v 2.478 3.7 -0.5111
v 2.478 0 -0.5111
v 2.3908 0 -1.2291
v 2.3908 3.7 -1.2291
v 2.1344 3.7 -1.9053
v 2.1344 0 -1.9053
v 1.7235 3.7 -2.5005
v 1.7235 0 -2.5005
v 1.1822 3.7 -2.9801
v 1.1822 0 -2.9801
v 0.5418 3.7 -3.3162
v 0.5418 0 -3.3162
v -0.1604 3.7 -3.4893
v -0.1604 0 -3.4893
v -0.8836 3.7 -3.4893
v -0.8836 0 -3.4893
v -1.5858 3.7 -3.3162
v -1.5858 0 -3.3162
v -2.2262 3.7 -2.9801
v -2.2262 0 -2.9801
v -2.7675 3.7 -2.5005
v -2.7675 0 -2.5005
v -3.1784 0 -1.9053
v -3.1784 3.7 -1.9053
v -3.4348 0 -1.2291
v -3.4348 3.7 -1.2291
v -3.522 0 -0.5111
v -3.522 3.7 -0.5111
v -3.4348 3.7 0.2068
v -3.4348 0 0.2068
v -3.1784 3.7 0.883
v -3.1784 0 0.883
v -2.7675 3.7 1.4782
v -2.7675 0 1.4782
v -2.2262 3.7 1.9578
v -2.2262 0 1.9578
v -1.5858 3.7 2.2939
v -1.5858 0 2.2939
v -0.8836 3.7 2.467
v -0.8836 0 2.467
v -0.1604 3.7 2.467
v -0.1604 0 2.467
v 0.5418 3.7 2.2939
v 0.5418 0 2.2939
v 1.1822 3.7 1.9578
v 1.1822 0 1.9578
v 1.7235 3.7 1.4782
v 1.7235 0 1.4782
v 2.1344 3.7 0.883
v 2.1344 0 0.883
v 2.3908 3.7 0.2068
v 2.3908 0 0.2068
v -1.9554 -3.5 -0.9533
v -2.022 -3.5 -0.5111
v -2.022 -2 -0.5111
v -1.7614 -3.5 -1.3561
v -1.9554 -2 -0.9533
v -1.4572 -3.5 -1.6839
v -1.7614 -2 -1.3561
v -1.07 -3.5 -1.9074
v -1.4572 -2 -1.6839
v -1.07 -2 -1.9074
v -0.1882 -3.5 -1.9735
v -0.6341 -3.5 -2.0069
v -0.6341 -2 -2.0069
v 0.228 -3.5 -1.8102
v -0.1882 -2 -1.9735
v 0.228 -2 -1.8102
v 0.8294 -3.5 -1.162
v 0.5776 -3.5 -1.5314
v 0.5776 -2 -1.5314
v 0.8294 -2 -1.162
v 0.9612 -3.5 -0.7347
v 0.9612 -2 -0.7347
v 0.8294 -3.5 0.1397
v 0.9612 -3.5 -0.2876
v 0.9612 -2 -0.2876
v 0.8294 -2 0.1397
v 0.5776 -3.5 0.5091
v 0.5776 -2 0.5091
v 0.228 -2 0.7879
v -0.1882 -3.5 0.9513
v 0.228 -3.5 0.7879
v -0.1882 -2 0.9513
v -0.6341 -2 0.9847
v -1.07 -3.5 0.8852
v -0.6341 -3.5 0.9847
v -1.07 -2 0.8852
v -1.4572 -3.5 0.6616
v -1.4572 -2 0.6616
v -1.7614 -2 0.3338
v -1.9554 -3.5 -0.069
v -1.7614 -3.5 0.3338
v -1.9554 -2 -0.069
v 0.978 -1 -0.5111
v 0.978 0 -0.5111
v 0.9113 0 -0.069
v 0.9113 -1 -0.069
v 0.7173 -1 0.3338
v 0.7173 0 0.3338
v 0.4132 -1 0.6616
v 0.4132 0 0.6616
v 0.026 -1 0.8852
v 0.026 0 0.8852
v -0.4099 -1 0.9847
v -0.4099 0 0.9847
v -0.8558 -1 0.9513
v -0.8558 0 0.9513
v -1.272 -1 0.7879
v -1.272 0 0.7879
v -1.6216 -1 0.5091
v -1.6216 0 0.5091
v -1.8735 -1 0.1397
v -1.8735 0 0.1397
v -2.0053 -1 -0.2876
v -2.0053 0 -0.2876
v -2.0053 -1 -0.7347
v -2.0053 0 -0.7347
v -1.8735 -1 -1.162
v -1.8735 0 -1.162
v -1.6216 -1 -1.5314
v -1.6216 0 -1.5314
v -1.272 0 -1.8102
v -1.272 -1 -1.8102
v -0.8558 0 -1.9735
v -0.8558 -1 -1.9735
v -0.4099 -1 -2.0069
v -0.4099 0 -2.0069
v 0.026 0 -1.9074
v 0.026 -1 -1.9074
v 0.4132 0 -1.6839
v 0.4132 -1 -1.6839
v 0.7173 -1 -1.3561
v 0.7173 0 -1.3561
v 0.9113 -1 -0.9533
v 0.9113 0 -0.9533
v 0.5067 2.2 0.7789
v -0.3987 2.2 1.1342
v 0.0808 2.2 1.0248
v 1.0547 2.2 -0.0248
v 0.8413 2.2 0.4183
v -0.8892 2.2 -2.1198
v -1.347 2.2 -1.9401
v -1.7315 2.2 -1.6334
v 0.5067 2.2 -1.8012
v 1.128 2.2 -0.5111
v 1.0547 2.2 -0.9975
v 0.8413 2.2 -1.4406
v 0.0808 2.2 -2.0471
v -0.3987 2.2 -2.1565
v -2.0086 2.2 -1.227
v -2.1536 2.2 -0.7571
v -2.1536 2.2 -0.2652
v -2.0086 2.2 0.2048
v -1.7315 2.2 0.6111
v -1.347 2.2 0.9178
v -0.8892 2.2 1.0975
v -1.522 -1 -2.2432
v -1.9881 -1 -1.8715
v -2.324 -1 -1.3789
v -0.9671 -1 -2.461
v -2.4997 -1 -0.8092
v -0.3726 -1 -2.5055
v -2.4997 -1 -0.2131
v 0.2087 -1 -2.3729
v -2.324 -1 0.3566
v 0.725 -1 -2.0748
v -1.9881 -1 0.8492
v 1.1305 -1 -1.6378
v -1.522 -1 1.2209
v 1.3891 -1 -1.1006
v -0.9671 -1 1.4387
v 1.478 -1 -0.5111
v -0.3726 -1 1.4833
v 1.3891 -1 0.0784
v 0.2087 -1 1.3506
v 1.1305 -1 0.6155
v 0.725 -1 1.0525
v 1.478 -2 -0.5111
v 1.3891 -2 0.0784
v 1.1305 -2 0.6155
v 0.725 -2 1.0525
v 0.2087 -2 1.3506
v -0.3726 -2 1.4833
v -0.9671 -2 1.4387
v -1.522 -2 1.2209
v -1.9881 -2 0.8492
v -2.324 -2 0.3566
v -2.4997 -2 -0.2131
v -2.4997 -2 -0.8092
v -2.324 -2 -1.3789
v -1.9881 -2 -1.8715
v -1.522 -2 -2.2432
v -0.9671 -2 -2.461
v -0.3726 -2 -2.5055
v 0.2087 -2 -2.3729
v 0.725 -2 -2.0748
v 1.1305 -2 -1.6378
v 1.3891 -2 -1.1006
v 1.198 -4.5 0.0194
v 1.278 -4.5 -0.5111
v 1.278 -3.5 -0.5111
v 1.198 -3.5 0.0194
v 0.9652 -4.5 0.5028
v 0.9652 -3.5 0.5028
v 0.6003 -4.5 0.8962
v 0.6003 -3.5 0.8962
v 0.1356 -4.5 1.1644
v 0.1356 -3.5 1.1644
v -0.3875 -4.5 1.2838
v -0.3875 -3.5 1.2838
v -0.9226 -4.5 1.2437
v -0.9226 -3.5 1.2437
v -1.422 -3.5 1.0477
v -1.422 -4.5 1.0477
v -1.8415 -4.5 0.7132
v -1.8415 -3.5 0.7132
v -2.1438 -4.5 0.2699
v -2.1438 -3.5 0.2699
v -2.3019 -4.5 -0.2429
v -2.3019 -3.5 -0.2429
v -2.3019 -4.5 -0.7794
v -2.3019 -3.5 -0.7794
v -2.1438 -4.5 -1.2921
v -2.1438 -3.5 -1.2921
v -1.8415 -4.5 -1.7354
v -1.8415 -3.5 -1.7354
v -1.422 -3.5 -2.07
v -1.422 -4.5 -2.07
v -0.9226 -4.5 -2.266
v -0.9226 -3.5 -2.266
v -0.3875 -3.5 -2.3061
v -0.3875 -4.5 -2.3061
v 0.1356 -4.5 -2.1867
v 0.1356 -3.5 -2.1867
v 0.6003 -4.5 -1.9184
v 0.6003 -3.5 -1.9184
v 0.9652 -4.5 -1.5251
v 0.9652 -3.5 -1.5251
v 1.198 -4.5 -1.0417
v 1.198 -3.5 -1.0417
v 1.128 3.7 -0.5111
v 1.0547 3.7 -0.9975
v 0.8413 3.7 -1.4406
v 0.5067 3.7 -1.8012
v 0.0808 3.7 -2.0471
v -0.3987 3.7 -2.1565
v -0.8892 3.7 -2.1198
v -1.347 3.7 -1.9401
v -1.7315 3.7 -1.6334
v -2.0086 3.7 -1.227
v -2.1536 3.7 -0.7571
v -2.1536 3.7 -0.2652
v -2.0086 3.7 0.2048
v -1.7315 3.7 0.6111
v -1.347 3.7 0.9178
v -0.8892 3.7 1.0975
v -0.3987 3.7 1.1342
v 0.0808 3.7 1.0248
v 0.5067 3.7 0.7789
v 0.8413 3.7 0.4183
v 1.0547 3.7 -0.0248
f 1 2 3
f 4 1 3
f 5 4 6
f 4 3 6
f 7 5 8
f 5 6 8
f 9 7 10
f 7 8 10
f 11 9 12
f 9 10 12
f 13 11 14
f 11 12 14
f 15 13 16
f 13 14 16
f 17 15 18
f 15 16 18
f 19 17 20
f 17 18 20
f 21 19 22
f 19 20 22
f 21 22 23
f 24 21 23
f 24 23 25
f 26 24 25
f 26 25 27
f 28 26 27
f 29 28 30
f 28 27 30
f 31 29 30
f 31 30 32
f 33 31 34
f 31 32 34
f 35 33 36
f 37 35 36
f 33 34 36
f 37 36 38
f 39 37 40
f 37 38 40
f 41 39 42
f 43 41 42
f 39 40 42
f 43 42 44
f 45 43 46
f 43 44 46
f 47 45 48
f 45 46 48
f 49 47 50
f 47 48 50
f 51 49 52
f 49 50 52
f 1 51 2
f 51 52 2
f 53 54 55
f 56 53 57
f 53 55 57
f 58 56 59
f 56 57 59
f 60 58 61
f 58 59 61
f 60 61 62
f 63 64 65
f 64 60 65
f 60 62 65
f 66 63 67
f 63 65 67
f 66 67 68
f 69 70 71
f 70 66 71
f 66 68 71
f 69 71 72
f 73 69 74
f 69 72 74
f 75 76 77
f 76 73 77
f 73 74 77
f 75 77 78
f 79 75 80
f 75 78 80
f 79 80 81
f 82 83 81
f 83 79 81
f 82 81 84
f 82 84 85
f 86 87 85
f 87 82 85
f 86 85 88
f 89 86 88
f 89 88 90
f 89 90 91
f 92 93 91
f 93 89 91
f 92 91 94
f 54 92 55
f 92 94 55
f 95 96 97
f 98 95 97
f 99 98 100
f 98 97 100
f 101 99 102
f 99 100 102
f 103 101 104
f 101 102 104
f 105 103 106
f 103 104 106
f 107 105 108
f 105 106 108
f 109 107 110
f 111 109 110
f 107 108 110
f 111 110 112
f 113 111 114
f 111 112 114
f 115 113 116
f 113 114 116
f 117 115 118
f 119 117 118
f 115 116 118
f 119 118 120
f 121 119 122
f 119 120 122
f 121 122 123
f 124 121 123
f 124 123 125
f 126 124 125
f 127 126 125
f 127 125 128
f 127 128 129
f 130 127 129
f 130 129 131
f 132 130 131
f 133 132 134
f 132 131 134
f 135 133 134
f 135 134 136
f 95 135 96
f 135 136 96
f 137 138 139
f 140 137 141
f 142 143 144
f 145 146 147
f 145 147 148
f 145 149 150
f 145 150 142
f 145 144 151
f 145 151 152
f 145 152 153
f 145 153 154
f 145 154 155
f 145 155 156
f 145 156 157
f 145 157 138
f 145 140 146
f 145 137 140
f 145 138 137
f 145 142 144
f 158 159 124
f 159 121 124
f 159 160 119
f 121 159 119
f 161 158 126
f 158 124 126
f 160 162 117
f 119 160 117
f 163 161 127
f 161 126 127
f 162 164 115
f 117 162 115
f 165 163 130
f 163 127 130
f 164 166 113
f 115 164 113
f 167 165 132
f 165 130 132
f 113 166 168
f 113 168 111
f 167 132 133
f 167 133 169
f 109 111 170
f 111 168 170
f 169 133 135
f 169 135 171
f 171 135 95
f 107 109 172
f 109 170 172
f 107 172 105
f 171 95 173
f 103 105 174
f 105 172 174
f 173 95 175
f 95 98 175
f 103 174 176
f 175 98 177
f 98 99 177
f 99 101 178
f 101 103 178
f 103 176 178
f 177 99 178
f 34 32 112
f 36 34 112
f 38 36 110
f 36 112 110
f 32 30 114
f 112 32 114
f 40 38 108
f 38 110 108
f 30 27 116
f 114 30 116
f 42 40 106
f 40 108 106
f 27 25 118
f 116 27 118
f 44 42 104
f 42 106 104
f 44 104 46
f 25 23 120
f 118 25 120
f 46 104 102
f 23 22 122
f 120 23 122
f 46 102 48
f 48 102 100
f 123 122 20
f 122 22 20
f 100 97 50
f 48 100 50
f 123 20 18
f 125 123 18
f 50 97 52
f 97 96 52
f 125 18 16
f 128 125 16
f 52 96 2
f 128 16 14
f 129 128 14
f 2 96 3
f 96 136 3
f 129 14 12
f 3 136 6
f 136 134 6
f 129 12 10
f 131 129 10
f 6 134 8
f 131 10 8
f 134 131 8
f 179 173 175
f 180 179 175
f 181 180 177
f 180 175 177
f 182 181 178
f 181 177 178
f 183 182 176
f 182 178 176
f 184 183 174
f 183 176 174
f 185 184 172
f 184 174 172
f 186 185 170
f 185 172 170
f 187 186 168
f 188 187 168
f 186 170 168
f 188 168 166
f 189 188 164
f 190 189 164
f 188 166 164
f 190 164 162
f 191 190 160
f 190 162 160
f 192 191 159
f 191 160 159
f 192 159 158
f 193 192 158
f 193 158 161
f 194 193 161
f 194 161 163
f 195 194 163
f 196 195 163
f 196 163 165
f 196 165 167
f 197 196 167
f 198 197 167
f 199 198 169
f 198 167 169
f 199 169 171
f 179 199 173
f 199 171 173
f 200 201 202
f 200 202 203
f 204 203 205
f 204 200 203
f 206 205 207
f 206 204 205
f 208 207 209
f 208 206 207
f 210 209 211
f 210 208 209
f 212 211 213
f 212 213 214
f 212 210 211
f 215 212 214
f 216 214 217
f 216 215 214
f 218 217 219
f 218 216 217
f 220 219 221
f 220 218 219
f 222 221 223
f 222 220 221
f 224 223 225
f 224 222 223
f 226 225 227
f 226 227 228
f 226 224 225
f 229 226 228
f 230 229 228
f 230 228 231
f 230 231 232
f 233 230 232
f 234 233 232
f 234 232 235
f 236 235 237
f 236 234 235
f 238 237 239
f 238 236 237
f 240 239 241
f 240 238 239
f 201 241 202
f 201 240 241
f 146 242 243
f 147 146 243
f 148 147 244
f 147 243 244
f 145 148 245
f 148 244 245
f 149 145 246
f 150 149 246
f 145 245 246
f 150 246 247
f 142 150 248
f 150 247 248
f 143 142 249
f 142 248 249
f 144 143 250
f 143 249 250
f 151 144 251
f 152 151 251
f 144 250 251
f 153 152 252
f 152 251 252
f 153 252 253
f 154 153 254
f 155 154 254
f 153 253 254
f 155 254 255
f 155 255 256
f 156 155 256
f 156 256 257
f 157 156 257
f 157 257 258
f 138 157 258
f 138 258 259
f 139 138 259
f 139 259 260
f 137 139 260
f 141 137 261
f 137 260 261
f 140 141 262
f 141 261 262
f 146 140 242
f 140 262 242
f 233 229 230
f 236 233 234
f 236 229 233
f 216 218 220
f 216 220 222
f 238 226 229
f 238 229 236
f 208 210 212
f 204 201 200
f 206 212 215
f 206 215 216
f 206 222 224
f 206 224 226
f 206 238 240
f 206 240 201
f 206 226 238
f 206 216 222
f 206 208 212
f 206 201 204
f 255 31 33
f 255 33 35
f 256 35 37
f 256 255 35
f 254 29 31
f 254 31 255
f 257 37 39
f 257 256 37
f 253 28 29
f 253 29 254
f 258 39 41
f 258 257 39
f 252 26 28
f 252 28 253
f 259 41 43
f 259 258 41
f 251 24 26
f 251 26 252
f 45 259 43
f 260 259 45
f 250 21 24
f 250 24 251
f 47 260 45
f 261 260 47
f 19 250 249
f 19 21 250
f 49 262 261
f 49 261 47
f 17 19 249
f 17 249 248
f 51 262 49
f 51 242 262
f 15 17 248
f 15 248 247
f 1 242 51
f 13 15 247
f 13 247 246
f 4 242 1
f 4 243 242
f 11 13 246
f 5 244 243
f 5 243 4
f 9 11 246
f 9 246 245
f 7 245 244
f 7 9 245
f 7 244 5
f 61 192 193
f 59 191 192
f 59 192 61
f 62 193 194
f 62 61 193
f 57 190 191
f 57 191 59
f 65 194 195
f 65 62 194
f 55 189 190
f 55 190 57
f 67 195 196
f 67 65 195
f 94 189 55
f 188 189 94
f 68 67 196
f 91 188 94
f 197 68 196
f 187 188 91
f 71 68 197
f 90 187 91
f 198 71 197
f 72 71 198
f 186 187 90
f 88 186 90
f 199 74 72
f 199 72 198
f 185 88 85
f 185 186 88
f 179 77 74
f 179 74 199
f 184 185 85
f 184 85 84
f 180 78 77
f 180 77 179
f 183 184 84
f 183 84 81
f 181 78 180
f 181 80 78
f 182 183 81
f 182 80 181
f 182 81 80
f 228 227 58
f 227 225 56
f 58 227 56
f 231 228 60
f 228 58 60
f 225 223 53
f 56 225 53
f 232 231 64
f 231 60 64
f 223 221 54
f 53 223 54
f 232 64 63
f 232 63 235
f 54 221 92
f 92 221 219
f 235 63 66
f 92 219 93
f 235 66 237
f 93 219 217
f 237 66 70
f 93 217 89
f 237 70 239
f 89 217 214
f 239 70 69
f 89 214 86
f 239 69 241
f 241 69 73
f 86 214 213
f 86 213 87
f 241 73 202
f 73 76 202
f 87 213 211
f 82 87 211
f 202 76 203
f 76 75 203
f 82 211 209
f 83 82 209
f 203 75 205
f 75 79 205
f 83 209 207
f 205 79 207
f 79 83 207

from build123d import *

# Parameters (mm, degrees)
SKETCH1_R           = 3
BOSS_EXTRUDE1_DEPTH = 3.7
SKETCH1_3_R         = 1.6
BOSS_EXTRUDE2_DEPTH = 1
SKETCH5_R           = 1.5
BOSS_EXTRUDE3_DEPTH = 1
SKETCH6_R           = 2
BOSS_EXTRUDE4_DEPTH = 1
SKETCH8_R           = 1.5
BOSS_EXTRUDE5_DEPTH = 2.5
SKETCH10_R          = 1.8
BOSS_EXTRUDE6_DEPTH = 1
SKETCH12_R          = 1.65
CUT_EXTRUDE1_DEPTH  = 1.5


with BuildPart() as part:
    # Sketch1 → Boss-Extrude1 (new body)
    with BuildSketch(Plane(origin=(0, 0, 0), x_dir=(1, 0, 0), z_dir=(0, 1, 0))):
        with Locations((-0.522013312, 0.511138034)):
            Circle(SKETCH1_R)
    extrude(amount=BOSS_EXTRUDE1_DEPTH)

    # Sketch1<3> → Boss-Extrude2 (add)
    with BuildSketch(Plane(origin=(0, 0, 0), x_dir=(1, 0, 0), z_dir=(0, 1, 0))):
        with Locations((-0.522013312, 0.511138034)):
            Circle(SKETCH1_3_R)
    extrude(amount=BOSS_EXTRUDE2_DEPTH)

    # Sketch5 → Boss-Extrude3 (add)
    with BuildSketch(Plane.XZ):
        with Locations((-0.522013312, -0.511138034)):
            Circle(SKETCH5_R)
    extrude(amount=BOSS_EXTRUDE3_DEPTH)

    # Sketch6 → Boss-Extrude4 (add)
    with BuildSketch(Plane.XZ.offset(1)):
        with Locations((-0.522013312, -0.511138034)):
            Circle(SKETCH6_R)
    extrude(amount=BOSS_EXTRUDE4_DEPTH)

    # Sketch8 → Boss-Extrude5 (add)
    with BuildSketch(Plane(origin=(0, -2, 0), x_dir=(-1, 0, 0), z_dir=(0, -1, 0))):
        with Locations((0.522013312, 0.511138034)):
            Circle(SKETCH8_R)
    extrude(amount=BOSS_EXTRUDE5_DEPTH)

    # Sketch10 → Boss-Extrude6 (add)
    with BuildSketch(Plane.XZ.offset(4.5)):
        with Locations((-0.522013312, -0.511138034)):
            Circle(SKETCH10_R)
    extrude(amount=-BOSS_EXTRUDE6_DEPTH)

    # Sketch12 → Cut-Extrude1 (cut)
    with BuildSketch(Plane(origin=(0, 3.7, 0), x_dir=(1, 0, 0), z_dir=(0, 1, 0))):
        with Locations((-0.522013312, 0.511138034)):
            Circle(SKETCH12_R)
    extrude(amount=-CUT_EXTRUDE1_DEPTH, mode=Mode.SUBTRACT)


solid = part.part
